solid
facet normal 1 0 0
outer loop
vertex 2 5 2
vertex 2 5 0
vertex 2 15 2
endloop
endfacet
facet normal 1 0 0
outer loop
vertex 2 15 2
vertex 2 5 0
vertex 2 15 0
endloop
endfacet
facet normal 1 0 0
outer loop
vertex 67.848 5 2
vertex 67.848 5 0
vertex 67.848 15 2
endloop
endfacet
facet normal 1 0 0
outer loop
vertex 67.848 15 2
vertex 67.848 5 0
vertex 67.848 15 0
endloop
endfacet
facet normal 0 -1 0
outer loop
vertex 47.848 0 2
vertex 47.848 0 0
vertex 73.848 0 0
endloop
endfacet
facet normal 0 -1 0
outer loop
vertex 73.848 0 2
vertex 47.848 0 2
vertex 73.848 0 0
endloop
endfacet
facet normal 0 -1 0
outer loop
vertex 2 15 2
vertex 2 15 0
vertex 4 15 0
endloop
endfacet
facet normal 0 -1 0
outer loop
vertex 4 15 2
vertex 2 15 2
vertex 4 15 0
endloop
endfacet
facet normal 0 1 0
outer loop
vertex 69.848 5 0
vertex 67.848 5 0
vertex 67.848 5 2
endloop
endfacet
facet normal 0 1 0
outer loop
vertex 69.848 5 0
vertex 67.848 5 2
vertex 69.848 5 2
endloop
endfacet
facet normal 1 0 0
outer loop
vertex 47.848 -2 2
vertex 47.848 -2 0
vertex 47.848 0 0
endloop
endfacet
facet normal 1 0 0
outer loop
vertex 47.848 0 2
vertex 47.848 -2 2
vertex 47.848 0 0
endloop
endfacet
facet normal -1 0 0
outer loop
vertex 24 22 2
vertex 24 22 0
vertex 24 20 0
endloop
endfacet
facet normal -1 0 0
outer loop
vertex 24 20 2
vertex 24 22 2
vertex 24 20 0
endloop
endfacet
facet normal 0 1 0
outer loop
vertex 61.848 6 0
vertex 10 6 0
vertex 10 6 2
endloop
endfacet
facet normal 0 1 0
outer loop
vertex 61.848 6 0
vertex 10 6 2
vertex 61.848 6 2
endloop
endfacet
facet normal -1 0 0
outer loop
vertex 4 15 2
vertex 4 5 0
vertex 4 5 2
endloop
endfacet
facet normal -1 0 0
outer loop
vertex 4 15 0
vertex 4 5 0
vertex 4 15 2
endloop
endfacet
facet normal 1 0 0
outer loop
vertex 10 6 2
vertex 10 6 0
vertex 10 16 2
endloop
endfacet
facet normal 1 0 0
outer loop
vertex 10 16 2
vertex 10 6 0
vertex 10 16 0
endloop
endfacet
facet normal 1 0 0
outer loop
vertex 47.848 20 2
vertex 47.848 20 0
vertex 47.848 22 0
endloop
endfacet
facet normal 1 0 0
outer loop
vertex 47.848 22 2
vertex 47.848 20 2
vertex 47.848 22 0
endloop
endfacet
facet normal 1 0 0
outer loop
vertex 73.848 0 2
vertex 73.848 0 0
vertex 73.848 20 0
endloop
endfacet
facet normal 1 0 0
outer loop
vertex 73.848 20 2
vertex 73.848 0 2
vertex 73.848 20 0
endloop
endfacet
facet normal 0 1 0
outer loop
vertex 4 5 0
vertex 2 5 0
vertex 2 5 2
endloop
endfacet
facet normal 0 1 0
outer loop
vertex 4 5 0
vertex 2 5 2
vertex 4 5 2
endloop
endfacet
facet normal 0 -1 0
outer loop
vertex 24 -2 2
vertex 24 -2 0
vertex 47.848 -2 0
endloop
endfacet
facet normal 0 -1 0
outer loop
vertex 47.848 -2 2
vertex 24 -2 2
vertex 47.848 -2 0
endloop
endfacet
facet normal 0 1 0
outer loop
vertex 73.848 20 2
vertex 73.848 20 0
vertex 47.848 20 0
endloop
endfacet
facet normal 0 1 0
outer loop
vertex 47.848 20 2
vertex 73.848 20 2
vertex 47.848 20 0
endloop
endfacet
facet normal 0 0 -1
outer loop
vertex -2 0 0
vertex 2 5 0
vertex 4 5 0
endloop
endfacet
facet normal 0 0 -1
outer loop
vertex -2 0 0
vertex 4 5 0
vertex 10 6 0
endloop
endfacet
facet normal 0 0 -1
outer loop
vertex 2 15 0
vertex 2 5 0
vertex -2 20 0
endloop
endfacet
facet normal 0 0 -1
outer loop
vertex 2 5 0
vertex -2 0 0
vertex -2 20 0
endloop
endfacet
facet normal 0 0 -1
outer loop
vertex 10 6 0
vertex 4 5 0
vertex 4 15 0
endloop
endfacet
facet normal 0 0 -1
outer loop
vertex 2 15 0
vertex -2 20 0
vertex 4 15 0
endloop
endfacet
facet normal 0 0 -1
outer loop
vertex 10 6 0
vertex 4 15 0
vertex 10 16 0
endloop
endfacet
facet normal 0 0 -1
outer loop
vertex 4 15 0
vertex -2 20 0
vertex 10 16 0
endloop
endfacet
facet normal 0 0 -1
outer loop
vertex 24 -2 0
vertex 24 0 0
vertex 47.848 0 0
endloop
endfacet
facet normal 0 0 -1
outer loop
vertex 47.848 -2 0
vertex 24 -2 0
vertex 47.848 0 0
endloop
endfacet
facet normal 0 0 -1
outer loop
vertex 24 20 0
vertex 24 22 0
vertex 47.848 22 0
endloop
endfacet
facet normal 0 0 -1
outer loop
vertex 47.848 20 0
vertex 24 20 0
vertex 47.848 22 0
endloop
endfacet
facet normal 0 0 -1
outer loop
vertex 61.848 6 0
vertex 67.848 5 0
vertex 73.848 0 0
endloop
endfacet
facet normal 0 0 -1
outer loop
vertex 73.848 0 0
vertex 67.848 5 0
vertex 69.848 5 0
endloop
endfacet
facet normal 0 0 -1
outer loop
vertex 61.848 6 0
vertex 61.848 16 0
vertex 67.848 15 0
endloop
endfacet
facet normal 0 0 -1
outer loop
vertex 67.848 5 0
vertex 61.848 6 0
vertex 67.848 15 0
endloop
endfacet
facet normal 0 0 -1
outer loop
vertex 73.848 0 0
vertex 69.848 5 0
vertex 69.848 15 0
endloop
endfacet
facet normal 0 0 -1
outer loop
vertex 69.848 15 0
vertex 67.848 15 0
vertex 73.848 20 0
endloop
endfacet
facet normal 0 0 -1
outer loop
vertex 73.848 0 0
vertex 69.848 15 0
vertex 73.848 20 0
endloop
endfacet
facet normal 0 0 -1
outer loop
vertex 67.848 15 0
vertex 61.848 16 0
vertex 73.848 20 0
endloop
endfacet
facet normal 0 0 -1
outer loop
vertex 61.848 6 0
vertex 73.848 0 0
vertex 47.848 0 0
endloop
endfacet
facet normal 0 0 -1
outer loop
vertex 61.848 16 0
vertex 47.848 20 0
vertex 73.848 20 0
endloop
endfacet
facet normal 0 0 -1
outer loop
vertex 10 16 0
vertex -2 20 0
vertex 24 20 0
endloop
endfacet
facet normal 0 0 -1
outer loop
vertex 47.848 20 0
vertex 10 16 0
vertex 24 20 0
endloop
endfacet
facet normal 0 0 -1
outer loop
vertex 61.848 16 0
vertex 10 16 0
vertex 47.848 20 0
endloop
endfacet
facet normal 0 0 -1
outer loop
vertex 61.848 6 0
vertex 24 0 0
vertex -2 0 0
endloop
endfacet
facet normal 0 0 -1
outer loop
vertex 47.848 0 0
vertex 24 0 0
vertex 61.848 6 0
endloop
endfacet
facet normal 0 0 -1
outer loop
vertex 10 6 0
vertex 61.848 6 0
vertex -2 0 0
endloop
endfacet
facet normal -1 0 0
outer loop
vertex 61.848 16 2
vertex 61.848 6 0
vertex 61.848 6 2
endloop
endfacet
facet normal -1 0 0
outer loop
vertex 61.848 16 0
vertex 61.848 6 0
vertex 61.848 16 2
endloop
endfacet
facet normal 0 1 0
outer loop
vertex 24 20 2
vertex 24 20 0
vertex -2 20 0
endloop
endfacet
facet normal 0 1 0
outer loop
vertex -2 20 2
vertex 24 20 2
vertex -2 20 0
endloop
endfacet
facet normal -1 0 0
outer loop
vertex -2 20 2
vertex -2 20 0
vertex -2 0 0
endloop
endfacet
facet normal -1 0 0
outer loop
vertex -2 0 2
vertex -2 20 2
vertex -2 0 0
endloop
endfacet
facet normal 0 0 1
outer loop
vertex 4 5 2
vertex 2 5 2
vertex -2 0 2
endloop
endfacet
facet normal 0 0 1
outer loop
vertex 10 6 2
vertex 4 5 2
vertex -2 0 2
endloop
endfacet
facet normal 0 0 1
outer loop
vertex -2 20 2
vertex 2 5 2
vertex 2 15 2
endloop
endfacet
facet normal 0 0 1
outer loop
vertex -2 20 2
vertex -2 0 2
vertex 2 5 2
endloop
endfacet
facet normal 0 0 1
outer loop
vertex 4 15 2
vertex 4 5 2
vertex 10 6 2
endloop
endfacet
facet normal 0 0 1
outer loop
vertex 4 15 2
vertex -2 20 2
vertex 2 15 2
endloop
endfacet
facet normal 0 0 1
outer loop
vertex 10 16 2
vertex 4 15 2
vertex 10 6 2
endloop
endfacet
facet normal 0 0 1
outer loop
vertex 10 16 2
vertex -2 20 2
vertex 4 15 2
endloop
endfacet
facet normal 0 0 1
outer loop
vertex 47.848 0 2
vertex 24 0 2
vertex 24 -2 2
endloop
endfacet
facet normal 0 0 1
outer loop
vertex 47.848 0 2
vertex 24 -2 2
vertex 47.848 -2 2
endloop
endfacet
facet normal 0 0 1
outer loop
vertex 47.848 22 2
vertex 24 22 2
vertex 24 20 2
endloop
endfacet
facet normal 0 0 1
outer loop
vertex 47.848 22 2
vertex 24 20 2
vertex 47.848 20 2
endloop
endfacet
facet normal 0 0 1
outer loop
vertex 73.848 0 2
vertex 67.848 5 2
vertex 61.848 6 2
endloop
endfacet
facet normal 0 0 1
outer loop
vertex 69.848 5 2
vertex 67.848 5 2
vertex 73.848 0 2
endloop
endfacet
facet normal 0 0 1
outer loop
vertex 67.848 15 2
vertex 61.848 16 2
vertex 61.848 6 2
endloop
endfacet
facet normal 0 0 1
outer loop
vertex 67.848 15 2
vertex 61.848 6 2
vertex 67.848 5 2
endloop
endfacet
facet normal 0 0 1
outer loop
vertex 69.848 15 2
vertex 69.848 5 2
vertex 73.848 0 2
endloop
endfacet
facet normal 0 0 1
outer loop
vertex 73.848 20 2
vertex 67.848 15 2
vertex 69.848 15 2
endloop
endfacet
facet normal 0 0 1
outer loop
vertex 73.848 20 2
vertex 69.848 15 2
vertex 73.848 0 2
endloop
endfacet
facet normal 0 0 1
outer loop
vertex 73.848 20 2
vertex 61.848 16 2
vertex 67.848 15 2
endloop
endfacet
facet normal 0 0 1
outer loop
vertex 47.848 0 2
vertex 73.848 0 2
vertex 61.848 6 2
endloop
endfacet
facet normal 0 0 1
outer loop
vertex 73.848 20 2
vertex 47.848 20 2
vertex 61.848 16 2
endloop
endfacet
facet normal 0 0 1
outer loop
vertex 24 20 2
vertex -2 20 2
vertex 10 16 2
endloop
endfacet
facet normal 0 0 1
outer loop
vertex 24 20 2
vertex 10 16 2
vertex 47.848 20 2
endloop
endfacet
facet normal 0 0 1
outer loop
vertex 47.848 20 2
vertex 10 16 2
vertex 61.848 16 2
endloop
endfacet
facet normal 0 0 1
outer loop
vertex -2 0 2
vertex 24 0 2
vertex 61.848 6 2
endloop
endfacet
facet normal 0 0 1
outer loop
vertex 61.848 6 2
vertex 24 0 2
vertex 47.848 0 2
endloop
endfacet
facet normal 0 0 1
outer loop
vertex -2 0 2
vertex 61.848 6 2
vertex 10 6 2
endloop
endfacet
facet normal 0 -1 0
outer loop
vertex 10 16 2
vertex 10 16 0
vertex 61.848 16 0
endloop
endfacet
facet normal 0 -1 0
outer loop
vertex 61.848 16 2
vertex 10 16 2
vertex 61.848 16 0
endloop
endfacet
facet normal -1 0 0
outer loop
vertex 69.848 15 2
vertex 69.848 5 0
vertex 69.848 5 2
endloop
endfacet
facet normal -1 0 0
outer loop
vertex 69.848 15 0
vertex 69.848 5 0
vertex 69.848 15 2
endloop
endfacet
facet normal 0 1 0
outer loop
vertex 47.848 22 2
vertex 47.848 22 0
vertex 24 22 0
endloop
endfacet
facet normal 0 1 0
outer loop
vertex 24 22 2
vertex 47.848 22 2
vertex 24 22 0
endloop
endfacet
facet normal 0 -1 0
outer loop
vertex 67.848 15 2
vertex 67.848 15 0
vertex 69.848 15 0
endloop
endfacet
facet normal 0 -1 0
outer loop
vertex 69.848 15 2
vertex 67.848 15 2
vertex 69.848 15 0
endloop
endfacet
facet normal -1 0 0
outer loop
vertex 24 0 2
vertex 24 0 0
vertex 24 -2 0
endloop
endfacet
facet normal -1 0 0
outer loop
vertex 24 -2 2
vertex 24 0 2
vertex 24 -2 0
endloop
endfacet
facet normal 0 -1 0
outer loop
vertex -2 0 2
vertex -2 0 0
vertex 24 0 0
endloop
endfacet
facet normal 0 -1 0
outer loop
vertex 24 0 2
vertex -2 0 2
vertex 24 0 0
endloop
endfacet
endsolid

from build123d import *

# Parameters (mm, degrees)
SKETCH1_W           = 51.848
SKETCH1_H           = 10
SKETCH1_W_2         = 2
BOSS_EXTRUDE1_DEPTH = 2


with BuildPart() as part:
    # Sketch1 → Boss-Extrude1 (new body)
    with BuildSketch(Plane.XY):
        Polygon((0, 0), (24, 0), (24, -2), (47.848, -2), (47.848, 0), (71.848, 0), (73.848, 0), (73.848, 20), (71.848, 20), (47.848, 20), (47.848, 22), (24, 22), (24, 20), (0, 20), (-2, 20), (-2, 0), align=None)
        with Locations((35.924, 11)):
            Rectangle(SKETCH1_W, SKETCH1_H, mode=Mode.SUBTRACT)
        with Locations((3, 10)):
            Rectangle(SKETCH1_W_2, SKETCH1_H, mode=Mode.SUBTRACT)
        with Locations((68.848, 10)):
            Rectangle(SKETCH1_W_2, SKETCH1_H, mode=Mode.SUBTRACT)
    extrude(amount=BOSS_EXTRUDE1_DEPTH)


solid = part.part
